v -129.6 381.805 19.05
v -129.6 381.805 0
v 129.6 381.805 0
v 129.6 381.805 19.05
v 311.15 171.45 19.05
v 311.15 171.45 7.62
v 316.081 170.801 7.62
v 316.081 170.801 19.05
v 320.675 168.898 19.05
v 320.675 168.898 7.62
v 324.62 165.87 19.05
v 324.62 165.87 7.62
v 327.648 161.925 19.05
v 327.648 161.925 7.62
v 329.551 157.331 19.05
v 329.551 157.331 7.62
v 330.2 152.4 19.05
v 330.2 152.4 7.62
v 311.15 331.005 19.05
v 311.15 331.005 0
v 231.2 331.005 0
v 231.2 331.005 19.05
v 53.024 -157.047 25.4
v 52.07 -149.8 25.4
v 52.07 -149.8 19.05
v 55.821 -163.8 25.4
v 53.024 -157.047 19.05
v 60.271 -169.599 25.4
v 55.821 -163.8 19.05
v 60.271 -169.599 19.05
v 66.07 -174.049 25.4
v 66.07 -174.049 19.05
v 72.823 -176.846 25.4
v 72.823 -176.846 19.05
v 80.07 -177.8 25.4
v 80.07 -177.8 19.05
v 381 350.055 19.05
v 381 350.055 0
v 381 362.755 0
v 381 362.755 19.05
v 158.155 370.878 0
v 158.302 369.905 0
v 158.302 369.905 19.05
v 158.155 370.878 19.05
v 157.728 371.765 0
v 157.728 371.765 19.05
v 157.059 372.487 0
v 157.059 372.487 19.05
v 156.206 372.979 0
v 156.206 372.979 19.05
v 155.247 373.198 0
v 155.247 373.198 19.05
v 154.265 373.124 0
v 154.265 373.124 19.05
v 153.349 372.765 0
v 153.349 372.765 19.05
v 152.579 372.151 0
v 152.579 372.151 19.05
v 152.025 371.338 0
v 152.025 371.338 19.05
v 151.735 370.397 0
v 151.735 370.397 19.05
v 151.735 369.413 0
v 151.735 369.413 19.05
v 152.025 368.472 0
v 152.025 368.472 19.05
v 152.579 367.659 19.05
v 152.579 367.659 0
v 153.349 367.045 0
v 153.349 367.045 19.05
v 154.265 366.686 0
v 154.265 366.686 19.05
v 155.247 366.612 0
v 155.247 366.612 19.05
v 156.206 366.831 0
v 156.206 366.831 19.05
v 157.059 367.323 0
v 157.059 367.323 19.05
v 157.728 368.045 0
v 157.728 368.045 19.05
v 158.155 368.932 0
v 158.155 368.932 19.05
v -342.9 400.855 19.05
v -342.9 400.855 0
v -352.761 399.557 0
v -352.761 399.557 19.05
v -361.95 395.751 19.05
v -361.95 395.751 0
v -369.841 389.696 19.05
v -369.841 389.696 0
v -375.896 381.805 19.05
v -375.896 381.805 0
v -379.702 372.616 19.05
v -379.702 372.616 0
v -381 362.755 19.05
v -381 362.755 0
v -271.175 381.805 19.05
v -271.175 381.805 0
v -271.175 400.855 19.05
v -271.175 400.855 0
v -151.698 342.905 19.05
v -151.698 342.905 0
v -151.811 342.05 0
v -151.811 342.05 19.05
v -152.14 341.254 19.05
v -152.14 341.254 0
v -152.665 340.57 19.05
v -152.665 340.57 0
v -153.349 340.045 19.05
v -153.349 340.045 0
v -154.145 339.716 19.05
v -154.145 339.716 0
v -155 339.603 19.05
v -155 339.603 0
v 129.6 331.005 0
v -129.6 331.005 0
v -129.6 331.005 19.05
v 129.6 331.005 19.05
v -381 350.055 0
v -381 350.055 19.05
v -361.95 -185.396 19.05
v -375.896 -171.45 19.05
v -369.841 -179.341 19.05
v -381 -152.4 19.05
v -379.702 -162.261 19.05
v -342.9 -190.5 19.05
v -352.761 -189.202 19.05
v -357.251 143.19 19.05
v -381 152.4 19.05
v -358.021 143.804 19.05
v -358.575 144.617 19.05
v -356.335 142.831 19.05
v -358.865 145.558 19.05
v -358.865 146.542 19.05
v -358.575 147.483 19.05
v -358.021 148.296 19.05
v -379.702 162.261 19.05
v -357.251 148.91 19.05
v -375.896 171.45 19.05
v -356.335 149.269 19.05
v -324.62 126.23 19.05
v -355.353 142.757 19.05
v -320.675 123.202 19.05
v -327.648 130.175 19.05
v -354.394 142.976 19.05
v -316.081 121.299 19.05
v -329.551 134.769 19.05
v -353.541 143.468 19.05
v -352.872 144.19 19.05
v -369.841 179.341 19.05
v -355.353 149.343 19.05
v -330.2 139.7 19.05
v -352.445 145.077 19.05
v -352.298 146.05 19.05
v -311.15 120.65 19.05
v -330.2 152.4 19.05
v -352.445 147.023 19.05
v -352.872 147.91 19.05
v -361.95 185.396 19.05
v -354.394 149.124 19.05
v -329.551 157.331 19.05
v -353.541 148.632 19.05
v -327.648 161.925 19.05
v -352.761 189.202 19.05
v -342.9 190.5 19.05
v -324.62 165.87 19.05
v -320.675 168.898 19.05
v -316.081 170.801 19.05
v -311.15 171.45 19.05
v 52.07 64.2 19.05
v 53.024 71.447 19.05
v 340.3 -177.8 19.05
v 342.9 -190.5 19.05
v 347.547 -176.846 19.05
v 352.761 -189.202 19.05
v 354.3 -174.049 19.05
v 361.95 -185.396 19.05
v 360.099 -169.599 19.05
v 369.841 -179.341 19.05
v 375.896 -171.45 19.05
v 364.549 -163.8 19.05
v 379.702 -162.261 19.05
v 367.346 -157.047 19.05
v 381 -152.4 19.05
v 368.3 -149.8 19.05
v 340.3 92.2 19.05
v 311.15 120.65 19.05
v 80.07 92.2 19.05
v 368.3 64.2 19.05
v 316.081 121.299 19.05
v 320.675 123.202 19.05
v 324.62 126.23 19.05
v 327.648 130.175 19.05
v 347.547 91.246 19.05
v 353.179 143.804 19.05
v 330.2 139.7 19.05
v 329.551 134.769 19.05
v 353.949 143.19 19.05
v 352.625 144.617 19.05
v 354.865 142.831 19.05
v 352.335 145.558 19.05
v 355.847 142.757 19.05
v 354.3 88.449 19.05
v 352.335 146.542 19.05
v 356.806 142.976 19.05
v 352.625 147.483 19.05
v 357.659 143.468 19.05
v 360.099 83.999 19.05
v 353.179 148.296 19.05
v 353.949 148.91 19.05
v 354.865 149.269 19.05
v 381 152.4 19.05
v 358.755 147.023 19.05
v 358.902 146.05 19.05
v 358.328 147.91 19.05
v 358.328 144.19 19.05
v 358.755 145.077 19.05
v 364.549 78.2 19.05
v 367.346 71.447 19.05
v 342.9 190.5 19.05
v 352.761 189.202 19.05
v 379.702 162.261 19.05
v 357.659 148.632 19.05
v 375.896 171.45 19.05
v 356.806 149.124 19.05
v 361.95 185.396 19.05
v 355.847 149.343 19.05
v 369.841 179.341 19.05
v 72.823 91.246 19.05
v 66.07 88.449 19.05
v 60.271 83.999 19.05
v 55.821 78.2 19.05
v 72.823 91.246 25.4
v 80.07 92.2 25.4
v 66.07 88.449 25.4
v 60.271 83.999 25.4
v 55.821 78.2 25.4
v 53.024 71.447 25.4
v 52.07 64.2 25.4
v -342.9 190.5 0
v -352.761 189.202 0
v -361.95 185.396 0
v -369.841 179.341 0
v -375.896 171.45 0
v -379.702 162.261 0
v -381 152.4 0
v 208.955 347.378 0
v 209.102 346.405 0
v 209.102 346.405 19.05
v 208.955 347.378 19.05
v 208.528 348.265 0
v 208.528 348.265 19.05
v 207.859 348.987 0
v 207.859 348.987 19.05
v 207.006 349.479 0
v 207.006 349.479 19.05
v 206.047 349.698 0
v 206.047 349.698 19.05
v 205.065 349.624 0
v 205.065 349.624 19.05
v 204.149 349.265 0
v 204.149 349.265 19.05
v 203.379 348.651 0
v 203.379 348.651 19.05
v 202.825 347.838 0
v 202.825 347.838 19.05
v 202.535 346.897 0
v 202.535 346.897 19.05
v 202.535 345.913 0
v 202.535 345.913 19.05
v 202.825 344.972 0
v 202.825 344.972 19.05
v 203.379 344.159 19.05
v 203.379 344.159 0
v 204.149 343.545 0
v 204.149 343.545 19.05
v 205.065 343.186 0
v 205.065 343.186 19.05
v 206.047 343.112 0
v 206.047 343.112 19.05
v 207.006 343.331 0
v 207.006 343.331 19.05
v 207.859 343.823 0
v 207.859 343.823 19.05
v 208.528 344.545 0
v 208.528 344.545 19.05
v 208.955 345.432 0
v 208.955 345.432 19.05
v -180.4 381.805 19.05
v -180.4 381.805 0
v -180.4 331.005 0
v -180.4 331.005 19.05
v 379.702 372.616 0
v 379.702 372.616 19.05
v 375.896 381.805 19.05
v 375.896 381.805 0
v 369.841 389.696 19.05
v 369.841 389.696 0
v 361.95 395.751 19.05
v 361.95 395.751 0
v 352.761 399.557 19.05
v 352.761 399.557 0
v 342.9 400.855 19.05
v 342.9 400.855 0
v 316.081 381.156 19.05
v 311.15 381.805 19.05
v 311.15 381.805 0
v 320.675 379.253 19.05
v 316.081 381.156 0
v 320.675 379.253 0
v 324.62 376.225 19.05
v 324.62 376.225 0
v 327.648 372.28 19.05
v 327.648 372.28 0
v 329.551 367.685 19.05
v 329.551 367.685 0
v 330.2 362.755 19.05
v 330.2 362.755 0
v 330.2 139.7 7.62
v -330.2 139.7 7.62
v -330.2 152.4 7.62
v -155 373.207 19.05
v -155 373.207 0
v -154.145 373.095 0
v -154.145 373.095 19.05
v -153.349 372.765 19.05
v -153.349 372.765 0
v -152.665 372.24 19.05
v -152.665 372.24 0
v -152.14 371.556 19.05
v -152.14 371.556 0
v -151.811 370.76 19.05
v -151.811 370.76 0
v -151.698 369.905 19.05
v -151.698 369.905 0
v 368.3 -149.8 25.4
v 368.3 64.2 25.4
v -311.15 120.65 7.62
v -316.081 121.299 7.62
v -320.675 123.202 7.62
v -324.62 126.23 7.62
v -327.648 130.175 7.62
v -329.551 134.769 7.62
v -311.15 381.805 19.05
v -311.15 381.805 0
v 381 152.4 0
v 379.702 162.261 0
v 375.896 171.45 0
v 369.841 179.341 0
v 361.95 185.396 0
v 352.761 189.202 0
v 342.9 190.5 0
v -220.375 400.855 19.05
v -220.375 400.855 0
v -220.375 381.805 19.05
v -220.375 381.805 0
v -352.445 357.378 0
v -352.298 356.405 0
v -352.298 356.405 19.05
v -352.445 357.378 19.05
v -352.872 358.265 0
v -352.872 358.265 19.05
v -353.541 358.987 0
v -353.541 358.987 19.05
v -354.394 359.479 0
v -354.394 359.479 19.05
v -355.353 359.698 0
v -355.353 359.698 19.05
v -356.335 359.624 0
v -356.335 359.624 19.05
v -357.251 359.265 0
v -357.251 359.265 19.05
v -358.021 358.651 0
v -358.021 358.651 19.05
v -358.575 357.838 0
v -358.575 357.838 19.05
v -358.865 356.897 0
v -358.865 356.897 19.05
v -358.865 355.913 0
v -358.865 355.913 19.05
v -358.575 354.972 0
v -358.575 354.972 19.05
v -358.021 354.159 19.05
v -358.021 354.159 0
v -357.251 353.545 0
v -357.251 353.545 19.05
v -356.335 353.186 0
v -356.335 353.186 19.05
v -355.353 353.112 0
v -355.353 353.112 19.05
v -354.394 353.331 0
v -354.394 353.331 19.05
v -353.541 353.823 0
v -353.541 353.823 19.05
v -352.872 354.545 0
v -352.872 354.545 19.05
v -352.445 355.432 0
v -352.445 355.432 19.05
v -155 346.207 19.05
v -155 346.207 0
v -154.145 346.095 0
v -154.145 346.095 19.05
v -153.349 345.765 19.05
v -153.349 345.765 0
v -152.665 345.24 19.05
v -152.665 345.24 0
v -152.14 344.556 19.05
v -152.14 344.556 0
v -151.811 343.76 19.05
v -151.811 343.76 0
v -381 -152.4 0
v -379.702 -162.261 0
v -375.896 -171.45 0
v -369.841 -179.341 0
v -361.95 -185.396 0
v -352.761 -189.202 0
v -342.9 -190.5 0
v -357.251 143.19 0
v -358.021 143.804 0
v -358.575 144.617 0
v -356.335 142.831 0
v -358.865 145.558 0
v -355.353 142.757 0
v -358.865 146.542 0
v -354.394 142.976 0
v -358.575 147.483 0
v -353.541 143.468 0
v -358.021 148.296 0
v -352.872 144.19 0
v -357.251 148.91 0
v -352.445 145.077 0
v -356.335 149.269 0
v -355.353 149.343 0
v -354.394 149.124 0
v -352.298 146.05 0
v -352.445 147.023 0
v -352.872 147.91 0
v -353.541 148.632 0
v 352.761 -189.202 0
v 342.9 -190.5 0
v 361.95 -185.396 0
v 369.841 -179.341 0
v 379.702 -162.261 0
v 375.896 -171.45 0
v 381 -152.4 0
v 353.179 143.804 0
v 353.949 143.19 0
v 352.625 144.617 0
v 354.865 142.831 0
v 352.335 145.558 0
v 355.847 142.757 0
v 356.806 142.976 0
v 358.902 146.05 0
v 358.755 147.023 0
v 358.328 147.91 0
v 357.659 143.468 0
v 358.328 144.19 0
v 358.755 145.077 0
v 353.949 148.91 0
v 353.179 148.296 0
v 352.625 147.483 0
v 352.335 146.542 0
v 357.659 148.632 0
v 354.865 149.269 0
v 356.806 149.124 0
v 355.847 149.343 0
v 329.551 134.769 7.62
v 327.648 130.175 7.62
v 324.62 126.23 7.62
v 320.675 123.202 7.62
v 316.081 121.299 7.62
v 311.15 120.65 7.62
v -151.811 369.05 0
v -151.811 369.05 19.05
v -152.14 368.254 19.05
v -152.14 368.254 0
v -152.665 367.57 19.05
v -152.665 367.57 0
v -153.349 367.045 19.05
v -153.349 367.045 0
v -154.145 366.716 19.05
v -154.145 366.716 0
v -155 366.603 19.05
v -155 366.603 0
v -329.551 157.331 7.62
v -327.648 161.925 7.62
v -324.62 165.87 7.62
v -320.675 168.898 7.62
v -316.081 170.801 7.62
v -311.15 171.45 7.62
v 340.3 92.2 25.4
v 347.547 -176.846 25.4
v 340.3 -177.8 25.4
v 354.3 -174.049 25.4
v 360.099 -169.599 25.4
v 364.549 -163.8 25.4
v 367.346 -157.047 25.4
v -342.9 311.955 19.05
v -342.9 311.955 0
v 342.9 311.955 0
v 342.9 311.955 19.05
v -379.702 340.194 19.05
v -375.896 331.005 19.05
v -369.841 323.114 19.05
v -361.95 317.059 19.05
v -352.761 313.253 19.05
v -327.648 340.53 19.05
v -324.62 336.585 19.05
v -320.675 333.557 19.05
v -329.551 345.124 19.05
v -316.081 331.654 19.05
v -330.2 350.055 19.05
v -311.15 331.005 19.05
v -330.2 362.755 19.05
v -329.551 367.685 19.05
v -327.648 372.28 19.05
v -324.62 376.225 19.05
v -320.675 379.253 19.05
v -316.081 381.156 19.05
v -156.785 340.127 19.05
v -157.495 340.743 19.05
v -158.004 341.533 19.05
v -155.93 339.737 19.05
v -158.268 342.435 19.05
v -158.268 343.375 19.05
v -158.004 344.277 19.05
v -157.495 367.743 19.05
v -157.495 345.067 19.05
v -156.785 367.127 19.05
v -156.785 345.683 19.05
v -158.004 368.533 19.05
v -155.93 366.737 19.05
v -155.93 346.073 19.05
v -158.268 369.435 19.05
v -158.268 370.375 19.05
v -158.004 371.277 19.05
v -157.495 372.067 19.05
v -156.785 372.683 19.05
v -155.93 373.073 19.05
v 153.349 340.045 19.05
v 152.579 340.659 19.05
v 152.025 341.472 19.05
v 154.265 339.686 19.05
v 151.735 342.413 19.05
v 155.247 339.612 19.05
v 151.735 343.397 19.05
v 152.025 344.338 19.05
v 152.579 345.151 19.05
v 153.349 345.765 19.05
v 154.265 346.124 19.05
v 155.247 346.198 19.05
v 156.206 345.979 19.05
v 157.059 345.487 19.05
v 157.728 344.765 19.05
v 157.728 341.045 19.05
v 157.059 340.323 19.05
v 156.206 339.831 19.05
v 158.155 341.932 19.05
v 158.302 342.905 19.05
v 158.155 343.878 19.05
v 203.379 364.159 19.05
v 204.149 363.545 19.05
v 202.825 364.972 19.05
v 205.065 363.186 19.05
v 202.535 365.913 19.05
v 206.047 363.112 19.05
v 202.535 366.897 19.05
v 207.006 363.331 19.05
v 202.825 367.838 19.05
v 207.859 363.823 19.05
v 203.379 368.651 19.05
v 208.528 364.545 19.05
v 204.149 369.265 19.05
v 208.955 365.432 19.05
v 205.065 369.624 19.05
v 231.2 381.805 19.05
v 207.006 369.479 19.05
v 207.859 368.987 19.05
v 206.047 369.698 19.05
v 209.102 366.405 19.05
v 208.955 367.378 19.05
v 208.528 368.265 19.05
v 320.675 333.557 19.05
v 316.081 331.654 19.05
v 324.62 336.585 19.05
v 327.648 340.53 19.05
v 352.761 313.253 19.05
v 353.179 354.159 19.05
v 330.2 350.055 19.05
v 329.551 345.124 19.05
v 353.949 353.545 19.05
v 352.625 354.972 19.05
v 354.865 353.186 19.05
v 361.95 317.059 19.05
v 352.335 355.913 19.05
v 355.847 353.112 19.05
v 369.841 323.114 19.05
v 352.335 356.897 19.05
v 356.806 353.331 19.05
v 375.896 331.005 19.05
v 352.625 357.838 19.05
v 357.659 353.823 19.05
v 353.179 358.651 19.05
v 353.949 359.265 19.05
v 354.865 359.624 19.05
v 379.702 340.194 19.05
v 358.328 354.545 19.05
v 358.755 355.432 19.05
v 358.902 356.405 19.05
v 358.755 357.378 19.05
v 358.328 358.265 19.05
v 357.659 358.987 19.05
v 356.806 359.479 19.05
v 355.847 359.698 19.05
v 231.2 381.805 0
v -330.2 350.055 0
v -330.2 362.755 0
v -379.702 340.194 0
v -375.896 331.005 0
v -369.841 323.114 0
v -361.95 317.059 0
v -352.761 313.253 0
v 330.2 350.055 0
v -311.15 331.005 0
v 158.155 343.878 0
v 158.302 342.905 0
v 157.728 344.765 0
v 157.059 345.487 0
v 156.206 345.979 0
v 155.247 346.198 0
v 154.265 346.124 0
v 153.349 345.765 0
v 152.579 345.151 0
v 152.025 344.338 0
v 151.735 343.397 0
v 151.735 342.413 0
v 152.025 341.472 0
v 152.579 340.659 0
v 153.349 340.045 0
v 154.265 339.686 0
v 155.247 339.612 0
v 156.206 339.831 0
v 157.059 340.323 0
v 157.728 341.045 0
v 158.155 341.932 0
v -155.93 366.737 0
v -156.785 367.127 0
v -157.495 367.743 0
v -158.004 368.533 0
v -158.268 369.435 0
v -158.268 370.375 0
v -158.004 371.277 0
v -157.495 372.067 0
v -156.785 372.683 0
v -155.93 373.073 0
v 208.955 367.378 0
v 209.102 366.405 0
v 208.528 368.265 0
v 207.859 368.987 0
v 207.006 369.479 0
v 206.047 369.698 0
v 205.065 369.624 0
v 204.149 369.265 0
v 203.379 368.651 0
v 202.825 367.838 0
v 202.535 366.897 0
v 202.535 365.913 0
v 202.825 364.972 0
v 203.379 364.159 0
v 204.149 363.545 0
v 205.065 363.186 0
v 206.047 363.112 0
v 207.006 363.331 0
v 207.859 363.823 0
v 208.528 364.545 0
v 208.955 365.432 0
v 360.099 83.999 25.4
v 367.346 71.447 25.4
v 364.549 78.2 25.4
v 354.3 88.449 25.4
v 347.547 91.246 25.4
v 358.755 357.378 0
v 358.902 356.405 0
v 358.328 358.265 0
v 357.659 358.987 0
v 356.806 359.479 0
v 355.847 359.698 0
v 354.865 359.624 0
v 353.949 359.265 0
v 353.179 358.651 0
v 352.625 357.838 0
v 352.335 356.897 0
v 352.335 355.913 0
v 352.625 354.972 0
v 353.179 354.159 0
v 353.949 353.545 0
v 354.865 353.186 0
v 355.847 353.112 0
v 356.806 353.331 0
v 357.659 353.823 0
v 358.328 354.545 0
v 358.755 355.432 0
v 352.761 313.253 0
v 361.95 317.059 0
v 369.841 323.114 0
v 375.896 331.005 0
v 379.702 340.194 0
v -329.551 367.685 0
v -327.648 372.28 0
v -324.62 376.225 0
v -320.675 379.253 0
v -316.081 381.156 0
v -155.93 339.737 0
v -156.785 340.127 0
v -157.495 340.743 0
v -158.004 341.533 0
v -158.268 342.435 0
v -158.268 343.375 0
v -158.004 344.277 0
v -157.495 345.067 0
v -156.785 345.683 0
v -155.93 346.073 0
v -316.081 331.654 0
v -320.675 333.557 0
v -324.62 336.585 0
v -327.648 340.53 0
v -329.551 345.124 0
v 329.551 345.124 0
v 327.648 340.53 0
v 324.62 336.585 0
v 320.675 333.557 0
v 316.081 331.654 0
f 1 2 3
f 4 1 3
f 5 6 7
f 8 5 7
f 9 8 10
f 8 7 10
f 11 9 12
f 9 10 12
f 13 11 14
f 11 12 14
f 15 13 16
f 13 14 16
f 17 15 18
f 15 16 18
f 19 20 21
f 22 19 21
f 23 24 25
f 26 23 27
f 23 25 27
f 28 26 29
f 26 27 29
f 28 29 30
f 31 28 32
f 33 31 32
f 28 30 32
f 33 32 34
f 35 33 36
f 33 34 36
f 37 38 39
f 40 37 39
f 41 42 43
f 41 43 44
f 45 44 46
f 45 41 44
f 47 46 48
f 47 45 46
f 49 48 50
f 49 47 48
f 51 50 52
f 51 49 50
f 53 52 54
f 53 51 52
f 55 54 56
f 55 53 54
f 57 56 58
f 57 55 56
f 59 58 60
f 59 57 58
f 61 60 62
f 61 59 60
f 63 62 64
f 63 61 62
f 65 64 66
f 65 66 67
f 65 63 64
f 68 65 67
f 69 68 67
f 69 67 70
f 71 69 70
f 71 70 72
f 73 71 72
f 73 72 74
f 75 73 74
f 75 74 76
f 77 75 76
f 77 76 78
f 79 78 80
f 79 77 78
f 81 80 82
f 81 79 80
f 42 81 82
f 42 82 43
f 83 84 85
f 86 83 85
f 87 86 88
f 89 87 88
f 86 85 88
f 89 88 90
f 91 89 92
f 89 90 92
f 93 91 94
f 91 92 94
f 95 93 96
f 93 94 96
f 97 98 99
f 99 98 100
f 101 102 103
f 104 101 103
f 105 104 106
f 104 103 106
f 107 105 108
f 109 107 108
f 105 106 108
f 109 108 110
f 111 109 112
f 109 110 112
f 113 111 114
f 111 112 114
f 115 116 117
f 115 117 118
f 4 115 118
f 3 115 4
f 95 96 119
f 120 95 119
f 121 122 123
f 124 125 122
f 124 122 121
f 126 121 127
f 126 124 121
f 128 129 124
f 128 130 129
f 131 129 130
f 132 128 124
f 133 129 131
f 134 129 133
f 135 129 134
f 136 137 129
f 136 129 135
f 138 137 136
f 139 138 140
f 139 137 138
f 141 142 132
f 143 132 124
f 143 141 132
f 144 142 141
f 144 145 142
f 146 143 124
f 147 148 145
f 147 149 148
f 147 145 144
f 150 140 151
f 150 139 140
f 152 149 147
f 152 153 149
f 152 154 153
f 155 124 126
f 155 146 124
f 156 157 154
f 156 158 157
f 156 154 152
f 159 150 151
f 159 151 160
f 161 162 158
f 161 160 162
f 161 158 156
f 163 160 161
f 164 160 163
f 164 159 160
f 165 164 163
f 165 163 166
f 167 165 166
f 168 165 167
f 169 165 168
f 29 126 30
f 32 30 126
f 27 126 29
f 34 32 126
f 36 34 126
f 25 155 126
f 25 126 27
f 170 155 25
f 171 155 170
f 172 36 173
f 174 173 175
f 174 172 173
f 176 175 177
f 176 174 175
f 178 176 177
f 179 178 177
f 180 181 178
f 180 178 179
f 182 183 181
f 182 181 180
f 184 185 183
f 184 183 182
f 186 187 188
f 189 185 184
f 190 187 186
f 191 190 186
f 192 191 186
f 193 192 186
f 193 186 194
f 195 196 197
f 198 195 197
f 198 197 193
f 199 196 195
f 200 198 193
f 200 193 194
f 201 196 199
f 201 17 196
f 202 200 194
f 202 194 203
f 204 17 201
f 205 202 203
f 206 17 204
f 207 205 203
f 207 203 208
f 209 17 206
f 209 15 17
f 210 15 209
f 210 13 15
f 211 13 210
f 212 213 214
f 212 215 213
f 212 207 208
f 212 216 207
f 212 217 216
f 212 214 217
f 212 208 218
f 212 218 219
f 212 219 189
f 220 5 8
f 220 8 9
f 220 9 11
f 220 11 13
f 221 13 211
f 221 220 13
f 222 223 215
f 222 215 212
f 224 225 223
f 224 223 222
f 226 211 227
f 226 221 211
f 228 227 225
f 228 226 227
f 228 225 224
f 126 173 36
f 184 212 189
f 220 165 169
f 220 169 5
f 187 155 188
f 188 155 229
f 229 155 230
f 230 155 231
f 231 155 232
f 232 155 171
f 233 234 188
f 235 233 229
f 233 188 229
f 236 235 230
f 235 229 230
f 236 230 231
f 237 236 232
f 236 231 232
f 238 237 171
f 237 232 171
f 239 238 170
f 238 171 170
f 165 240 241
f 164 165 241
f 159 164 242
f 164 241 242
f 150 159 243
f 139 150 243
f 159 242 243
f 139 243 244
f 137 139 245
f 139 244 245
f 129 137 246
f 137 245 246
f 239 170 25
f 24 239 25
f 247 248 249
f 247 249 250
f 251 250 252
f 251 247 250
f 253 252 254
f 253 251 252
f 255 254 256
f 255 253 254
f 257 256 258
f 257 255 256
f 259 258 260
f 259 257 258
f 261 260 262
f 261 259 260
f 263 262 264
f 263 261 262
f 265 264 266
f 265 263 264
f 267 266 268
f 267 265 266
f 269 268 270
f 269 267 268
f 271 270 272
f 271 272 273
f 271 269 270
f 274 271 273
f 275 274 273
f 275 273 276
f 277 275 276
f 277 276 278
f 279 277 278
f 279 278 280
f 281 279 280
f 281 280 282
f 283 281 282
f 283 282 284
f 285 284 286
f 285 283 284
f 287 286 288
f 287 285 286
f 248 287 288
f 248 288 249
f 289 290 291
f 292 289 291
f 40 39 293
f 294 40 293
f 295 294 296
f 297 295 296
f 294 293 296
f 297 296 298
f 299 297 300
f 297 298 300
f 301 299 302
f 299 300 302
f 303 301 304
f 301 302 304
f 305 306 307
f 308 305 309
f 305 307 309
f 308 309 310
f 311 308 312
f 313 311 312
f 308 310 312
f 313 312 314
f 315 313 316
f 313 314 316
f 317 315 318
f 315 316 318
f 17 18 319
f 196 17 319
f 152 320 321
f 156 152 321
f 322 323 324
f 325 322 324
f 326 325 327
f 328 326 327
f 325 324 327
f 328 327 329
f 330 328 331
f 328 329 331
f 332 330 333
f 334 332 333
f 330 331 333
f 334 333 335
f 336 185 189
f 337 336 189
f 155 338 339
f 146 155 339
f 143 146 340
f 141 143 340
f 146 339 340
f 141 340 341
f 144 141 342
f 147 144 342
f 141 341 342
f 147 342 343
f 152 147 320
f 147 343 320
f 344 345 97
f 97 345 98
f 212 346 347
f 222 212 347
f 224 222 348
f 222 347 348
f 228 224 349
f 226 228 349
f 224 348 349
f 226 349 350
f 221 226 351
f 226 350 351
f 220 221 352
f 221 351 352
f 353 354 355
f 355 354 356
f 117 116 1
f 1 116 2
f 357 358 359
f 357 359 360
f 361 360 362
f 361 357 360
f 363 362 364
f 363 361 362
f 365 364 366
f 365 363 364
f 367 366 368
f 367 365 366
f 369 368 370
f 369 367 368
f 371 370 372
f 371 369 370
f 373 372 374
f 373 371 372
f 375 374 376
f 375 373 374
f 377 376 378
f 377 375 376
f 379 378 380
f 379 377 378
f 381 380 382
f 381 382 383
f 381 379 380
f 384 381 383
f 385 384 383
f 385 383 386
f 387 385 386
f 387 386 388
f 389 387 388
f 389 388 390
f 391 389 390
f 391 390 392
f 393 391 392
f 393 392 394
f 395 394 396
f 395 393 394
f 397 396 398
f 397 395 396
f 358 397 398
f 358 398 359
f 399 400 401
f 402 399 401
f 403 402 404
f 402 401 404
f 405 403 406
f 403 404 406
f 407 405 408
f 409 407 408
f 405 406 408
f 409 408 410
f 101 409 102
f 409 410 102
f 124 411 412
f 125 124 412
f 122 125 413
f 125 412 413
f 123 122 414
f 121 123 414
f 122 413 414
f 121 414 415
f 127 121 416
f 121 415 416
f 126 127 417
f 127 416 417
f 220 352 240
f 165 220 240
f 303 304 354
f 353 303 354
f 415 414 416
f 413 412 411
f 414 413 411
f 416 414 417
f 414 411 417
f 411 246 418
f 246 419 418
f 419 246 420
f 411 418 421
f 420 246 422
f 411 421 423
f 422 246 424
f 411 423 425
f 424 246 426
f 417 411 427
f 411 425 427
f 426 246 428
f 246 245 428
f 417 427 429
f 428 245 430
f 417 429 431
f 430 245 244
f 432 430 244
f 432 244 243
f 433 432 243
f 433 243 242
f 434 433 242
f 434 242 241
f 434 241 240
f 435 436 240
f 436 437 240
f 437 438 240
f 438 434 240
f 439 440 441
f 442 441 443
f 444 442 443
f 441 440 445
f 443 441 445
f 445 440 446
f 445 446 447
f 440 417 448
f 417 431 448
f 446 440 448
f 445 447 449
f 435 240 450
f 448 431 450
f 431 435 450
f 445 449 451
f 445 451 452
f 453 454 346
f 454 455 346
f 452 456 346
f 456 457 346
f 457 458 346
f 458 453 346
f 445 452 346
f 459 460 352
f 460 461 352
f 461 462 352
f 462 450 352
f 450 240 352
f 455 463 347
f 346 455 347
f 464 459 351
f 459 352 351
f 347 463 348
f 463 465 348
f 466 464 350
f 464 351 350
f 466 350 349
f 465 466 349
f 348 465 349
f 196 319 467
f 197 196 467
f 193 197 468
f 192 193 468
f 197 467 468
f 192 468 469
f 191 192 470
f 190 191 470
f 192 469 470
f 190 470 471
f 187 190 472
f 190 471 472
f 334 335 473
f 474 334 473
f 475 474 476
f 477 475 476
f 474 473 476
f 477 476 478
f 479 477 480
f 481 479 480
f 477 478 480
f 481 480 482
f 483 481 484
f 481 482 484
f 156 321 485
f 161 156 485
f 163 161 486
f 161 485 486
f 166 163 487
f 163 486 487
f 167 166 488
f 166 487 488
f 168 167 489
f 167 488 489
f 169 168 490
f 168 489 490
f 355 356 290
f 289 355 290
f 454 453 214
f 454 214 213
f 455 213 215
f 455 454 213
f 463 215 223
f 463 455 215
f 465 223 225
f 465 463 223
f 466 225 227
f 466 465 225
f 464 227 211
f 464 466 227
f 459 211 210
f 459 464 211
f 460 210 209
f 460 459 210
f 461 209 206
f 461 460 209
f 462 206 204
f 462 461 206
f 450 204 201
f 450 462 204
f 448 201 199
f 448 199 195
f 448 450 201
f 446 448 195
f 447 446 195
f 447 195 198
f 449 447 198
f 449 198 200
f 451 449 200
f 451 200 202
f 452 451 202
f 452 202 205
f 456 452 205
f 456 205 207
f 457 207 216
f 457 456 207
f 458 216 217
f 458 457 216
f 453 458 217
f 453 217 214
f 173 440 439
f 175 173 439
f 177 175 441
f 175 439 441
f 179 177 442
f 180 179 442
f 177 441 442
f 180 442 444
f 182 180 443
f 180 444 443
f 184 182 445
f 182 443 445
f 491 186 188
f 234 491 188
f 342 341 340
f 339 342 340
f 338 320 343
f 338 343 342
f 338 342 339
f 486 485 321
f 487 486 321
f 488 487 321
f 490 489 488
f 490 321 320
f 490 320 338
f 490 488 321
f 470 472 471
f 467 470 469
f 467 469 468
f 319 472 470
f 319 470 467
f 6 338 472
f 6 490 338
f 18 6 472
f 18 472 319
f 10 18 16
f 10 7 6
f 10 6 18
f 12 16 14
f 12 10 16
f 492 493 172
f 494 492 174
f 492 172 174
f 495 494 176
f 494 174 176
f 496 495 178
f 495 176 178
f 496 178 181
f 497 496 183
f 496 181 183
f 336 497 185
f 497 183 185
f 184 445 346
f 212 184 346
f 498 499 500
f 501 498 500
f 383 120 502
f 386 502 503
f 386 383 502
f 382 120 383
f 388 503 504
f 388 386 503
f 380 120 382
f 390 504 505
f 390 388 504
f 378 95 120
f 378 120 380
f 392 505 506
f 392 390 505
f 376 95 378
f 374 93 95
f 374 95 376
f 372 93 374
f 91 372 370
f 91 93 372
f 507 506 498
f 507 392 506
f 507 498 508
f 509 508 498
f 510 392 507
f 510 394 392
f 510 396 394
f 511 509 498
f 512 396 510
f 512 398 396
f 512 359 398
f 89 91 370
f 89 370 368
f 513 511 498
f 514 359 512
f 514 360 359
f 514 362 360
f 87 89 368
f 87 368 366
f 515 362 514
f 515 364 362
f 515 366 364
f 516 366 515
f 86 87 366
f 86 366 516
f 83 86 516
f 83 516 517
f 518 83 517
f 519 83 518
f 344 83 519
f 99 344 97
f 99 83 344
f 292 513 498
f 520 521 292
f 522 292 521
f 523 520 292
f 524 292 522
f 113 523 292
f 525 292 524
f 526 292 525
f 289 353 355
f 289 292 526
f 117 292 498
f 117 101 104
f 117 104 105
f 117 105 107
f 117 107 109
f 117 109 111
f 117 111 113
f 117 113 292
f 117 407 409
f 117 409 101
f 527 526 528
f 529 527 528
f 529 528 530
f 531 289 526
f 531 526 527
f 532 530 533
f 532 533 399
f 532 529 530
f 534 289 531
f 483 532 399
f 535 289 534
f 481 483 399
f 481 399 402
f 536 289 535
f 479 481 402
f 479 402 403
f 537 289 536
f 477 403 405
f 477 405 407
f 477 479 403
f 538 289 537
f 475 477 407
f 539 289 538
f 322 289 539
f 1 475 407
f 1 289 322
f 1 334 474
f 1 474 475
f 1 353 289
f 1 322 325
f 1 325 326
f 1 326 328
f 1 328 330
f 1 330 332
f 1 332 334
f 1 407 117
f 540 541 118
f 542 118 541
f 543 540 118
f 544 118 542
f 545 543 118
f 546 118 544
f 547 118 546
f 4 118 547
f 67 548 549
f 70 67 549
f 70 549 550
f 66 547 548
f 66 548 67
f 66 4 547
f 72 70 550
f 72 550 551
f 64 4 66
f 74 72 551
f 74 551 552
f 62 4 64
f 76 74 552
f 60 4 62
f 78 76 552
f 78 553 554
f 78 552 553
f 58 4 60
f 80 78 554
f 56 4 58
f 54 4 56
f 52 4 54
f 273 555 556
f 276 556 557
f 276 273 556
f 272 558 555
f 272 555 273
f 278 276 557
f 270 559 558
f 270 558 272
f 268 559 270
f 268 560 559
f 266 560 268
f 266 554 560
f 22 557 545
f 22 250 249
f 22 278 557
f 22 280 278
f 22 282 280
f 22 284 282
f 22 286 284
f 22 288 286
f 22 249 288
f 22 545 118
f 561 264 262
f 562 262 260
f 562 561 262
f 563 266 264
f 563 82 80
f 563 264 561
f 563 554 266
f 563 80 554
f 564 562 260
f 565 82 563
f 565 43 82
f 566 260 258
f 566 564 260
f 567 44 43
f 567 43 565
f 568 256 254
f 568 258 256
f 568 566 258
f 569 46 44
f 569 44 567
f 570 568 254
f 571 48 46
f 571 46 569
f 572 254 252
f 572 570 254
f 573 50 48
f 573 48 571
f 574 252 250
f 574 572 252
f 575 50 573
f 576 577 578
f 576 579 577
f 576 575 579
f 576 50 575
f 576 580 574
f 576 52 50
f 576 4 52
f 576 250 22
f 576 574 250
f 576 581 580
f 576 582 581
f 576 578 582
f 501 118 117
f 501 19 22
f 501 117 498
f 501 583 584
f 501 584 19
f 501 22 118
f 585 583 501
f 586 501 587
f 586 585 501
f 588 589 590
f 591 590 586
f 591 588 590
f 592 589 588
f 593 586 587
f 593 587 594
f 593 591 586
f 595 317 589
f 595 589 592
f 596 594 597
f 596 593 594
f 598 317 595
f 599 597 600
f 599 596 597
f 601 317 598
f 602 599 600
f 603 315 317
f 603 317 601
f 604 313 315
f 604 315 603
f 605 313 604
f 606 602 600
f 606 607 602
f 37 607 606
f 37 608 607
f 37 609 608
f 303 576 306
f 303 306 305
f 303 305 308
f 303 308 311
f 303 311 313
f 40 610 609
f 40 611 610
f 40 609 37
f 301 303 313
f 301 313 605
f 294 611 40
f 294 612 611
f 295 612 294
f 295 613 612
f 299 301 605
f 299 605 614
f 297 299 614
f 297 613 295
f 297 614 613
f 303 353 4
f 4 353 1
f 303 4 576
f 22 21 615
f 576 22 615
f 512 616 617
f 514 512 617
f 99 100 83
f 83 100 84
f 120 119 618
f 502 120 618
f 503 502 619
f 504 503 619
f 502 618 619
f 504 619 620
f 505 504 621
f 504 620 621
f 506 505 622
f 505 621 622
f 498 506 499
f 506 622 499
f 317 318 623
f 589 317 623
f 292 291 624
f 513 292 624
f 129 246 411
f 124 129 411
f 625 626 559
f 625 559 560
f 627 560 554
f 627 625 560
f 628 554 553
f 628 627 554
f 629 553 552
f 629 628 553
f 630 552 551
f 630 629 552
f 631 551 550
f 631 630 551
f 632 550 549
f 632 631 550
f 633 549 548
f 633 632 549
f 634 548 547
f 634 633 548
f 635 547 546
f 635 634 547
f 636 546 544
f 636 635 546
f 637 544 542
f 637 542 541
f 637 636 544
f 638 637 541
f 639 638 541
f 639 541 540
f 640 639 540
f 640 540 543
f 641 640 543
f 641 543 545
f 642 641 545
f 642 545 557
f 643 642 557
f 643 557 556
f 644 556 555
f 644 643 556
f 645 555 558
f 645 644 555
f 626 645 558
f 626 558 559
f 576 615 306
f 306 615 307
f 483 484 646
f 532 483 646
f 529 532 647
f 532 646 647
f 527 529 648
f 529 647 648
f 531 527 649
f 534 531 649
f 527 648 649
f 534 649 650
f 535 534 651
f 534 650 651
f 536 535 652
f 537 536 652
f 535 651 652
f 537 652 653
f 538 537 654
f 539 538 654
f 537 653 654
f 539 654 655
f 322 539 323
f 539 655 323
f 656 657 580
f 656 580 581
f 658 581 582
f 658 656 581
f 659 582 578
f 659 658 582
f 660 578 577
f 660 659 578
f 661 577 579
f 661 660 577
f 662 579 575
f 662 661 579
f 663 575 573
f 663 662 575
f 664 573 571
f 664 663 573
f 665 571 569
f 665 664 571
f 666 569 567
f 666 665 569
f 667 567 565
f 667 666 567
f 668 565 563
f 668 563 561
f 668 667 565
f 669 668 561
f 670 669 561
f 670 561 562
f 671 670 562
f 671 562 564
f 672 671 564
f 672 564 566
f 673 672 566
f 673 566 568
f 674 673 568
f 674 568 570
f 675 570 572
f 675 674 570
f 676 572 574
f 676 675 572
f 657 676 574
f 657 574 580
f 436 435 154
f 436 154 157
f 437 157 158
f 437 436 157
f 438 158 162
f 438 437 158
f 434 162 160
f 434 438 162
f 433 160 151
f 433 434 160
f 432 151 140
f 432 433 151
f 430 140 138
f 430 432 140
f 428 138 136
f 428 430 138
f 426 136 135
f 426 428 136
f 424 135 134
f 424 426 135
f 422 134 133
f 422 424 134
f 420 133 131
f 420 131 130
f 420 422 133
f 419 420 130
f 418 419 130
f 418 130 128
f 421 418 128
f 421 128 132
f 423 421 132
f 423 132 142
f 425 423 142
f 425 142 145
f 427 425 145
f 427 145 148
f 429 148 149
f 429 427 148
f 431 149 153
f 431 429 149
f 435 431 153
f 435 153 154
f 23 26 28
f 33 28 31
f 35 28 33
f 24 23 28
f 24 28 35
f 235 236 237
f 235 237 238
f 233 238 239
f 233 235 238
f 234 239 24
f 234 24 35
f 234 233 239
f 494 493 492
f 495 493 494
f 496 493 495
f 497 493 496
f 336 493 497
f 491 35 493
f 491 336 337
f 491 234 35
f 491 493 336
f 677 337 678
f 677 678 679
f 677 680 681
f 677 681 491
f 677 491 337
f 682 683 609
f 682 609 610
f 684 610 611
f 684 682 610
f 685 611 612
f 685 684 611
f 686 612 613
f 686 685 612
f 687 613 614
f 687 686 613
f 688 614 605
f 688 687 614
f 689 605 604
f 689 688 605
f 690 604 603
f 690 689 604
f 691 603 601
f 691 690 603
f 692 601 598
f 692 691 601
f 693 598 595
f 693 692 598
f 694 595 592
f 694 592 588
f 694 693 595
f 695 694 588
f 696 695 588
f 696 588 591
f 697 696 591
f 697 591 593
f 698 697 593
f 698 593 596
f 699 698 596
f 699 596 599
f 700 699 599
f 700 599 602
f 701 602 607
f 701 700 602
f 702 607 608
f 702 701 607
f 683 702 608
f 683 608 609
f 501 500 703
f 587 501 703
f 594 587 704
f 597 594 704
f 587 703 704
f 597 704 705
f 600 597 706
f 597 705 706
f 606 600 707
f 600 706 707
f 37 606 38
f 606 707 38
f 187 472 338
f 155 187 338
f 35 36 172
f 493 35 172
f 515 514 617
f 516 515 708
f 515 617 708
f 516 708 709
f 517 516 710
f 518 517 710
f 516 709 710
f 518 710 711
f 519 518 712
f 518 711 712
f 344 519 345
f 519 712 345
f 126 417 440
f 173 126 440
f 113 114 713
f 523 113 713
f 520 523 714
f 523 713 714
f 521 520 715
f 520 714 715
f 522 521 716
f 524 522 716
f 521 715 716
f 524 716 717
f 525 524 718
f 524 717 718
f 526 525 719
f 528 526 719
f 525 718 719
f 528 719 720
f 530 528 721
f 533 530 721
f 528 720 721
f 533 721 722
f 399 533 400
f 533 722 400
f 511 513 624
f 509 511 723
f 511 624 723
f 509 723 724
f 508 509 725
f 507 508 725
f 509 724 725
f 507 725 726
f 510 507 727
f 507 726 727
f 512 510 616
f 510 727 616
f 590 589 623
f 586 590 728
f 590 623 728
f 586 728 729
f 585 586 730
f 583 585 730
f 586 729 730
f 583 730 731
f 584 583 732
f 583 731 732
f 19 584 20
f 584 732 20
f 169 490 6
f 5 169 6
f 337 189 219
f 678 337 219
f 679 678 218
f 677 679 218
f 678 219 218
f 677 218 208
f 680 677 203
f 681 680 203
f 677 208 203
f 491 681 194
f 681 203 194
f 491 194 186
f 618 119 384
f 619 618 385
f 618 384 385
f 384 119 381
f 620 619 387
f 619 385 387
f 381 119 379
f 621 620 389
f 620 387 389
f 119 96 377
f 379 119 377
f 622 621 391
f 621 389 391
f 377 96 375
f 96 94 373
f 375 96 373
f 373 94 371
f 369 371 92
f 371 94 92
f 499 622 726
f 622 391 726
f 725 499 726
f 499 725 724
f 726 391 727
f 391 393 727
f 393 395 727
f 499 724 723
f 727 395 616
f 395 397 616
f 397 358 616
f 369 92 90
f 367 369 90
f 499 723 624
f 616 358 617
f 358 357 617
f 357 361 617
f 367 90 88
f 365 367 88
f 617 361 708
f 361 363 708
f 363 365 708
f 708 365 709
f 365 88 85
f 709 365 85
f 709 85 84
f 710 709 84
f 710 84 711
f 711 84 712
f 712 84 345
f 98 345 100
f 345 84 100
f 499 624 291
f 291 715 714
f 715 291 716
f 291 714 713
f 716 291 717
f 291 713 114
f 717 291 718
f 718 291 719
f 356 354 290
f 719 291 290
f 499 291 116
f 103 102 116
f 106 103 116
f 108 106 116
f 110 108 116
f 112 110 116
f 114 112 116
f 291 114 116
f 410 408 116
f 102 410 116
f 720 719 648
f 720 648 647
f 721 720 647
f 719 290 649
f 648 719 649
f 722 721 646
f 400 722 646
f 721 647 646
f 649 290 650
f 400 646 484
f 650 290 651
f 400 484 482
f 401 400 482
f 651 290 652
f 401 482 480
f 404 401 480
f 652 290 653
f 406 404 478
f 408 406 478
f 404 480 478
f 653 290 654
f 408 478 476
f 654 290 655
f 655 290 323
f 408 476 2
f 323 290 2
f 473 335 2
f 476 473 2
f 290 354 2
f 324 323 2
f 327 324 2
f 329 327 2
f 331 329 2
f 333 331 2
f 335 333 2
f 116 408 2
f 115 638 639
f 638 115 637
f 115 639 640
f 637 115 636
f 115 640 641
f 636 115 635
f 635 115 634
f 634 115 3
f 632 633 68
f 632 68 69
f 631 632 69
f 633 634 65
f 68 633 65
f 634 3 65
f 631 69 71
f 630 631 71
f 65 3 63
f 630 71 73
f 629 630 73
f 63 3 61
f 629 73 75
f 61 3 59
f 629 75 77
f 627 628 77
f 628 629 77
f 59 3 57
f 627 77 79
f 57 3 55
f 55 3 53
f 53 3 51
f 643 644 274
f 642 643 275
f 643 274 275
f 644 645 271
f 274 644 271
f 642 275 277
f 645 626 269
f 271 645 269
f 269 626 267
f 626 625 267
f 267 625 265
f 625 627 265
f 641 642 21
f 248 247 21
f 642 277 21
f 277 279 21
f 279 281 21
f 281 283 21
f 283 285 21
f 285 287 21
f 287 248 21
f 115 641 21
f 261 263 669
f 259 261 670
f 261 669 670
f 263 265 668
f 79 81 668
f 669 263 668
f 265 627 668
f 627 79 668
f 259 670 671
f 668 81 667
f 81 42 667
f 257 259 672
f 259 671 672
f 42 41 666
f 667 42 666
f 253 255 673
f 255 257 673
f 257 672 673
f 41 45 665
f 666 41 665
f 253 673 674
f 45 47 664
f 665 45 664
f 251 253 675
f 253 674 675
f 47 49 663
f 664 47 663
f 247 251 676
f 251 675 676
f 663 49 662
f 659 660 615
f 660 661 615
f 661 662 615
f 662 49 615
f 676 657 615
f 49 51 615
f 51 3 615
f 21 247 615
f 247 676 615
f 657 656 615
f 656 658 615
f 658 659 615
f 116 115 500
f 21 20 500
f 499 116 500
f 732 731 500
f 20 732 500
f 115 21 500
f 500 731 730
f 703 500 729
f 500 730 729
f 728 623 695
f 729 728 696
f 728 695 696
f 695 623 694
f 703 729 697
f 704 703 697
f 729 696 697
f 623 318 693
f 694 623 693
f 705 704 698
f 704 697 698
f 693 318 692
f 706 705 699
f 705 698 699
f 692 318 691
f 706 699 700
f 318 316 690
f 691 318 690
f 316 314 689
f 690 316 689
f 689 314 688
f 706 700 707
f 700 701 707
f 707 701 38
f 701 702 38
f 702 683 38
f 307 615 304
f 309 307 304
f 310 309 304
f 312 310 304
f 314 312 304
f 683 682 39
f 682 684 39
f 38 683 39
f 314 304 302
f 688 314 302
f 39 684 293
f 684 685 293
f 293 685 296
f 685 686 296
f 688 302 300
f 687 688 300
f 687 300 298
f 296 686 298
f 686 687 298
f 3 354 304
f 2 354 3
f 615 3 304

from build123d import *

# Parameters (mm, degrees)
F0_R     = 3.302
F0_W     = 259.2
F0_H     = 50.8
F1_DEPTH = 19.05
F2_DEPTH = 19.05
F3_DEPTH = 7.62
F4_DEPTH = 25.4


# Not quite as in the source:
# - a feature names something its author has since deleted; it is built from what else it names


with BuildPart() as f1:
    # F0 (on Top) → F1 (new body)
    with BuildSketch(Plane.XY):
        with BuildLine():
            ThreePointArc((-381, 350.0549432278), (-369.8407683632, 323.1141748646), (-342.9, 311.9549432278))
            Line((-342.9, 311.9549432278), (342.9, 311.9549432278))
            ThreePointArc((342.9, 311.9549432278), (369.8407683632, 323.1141748646), (381, 350.0549432278))
            Line((381, 350.0549432278), (381, 362.7549432278))
            ThreePointArc((381, 362.7549432278), (369.8407683632, 389.695711591), (342.9, 400.8549432278))
            Line((342.9, 400.8549432278), (-220.375, 400.8549432278))
            Line((-220.375, 400.8549432278), (-220.375, 381.8049432278))
            Line((-220.375, 381.8049432278), (-180.4, 381.8049432278))
            Line((-180.4, 381.8049432278), (-180.4, 331.0049432278))
            Line((-180.4, 331.0049432278), (-311.15, 331.0049432278))
            ThreePointArc((-311.15, 331.0049432278), (-324.6203841816, 336.5845590462), (-330.2, 350.0549432278))
            Line((-330.2, 350.0549432278), (-330.2, 362.7549432278))
            ThreePointArc((-330.2, 362.7549432278), (-324.6203841816, 376.2253274094), (-311.15, 381.8049432278))
            Line((-311.15, 381.8049432278), (-271.175, 381.8049432278))
            Line((-271.175, 381.8049432278), (-271.175, 400.8549432278))
            Line((-271.175, 400.8549432278), (-342.9, 400.8549432278))
            ThreePointArc((-342.9, 400.8549432278), (-369.8407683632, 389.695711591), (-381, 362.7549432278))
            Line((-381, 362.7549432278), (-381, 350.0549432278))
        make_face()
        with Locations((-355.6, 356.4049432278)):
            Circle(F0_R, mode=Mode.SUBTRACT)
        with BuildLine():
            ThreePointArc((-155, 339.6030464278), (-158.302, 342.9050464278), (-155, 346.2070464278))
            ThreePointArc((-155, 346.2070464278), (-152.6651334085, 345.2399130192), (-151.698, 342.9050464278))
            ThreePointArc((-151.698, 342.9050464278), (-152.6651334085, 340.5701798363), (-155, 339.6030464278))
        make_face(mode=Mode.SUBTRACT)
        with BuildLine():
            ThreePointArc((-155, 366.6030432278), (-158.302, 369.9050432278), (-155, 373.2070432278))
            ThreePointArc((-155, 373.2070432278), (-152.6651334085, 372.2399098192), (-151.698, 369.9050432278))
            ThreePointArc((-151.698, 369.9050432278), (-152.6651334085, 367.5701766363), (-155, 366.6030432278))
        make_face(mode=Mode.SUBTRACT)
        with Locations((0, 356.4049432278)):
            Rectangle(F0_W, F0_H, mode=Mode.SUBTRACT)
        with Locations((155, 342.9050464278)):
            Circle(F0_R, mode=Mode.SUBTRACT)
        with Locations((155, 369.9050432278)):
            Circle(F0_R, mode=Mode.SUBTRACT)
        with Locations((205.8, 346.4049378278)):
            Circle(F0_R, mode=Mode.SUBTRACT)
        with Locations((205.8, 366.4049486278)):
            Circle(F0_R, mode=Mode.SUBTRACT)
        with BuildLine():
            Line((231.2, 331.0049432278), (231.2, 381.8049432278))
            Line((231.2, 381.8049432278), (311.15, 381.8049432278))
            ThreePointArc((311.15, 381.8049432278), (324.6203841816, 376.2253274094), (330.2, 362.7549432278))
            Line((330.2, 362.7549432278), (330.2, 350.0549432278))
            ThreePointArc((330.2, 350.0549432278), (324.6203841816, 336.5845590462), (311.15, 331.0049432278))
            Line((311.15, 331.0049432278), (231.2, 331.0049432278))
        make_face(mode=Mode.SUBTRACT)
        with Locations((355.6, 356.4049432278)):
            Circle(F0_R, mode=Mode.SUBTRACT)
    extrude(amount=F1_DEPTH)


with BuildPart() as f2:
    # F0 (on Top) → F2 (new body)
    with BuildSketch(Plane.XY):
        with BuildLine():
            Line((-342.9, -190.5), (342.9, -190.5))
            ThreePointArc((342.9, -190.5), (369.8407683632, -179.3407683632), (381, -152.4))
            Line((381, -152.4), (381, 152.4))
            ThreePointArc((381, 152.4), (369.8407683632, 179.3407683632), (342.9, 190.5))
            Line((342.9, 190.5), (-342.9, 190.5))
            ThreePointArc((-342.9, 190.5), (-369.8407683632, 179.3407683632), (-381, 152.4))
            Line((-381, 152.4), (-381, -152.4))
            ThreePointArc((-381, -152.4), (-369.8407683632, -179.3407683632), (-342.9, -190.5))
        make_face()
        with BuildLine():
            ThreePointArc((368.3, -149.8), (360.0989898732, -169.5989898732), (340.3, -177.8))
            Line((340.3, -177.8), (80.07, -177.8))
            ThreePointArc((80.07, -177.8), (60.2710101268, -169.5989898732), (52.07, -149.8))
            Line((52.07, -149.8), (52.07, 64.2))
            ThreePointArc((52.07, 64.2), (60.2710101268, 83.9989898732), (80.07, 92.2))
            Line((80.07, 92.2), (340.3, 92.2))
            ThreePointArc((340.3, 92.2), (360.0989898732, 83.9989898732), (368.3, 64.2))
            Line((368.3, 64.2), (368.3, -149.8))
        make_face(mode=Mode.SUBTRACT)
        with Locations((-355.6, 146.05)):
            Circle(F0_R, mode=Mode.SUBTRACT)
        with BuildLine():
            ThreePointArc((-330.2, 152.4), (-324.6203841816, 165.8703841816), (-311.15, 171.45))
            Line((-311.15, 171.45), (311.15, 171.45))
            ThreePointArc((311.15, 171.45), (324.6203841816, 165.8703841816), (330.2, 152.4))
            Line((330.2, 152.4), (330.2, 139.7))
            ThreePointArc((330.2, 139.7), (324.6203841816, 126.2296158184), (311.15, 120.65))
            Line((311.15, 120.65), (-311.15, 120.65))
            ThreePointArc((-311.15, 120.65), (-324.6203841816, 126.2296158184), (-330.2, 139.7))
            Line((-330.2, 139.7), (-330.2, 152.4))
        make_face(mode=Mode.SUBTRACT)
        with Locations((355.6, 146.05)):
            Circle(F0_R, mode=Mode.SUBTRACT)
        with BuildLine():
            Line((80.07, -177.8), (340.3, -177.8))
            ThreePointArc((340.3, -177.8), (360.0989898732, -169.5989898732), (368.3, -149.8))
            Line((368.3, -149.8), (368.3, 64.2))
            ThreePointArc((368.3, 64.2), (360.0989898732, 83.9989898732), (340.3, 92.2))
            Line((340.3, 92.2), (80.07, 92.2))
            ThreePointArc((80.07, 92.2), (60.2710101268, 83.9989898732), (52.07, 64.2))
            Line((52.07, 64.2), (52.07, -149.8))
            ThreePointArc((52.07, -149.8), (60.2710101268, -169.5989898732), (80.07, -177.8))
        make_face()
    extrude(amount=F2_DEPTH)

    # F0 (on Top) → F3 (join)
    with BuildSketch(Plane.XY):
        with BuildLine():
            Line((311.15, 171.45), (-311.15, 171.45))
            ThreePointArc((-311.15, 171.45), (-324.6203841816, 165.8703841816), (-330.2, 152.4))
            Line((-330.2, 152.4), (-330.2, 139.7))
            ThreePointArc((-330.2, 139.7), (-324.6203841816, 126.2296158184), (-311.15, 120.65))
            Line((-311.15, 120.65), (311.15, 120.65))
            ThreePointArc((311.15, 120.65), (324.6203841816, 126.2296158184), (330.2, 139.7))
            Line((330.2, 139.7), (330.2, 152.4))
            ThreePointArc((330.2, 152.4), (324.6203841816, 165.8703841816), (311.15, 171.45))
        make_face()
    extrude(amount=F3_DEPTH)

    # F0 (on Top) → F4 (join)
    with BuildSketch(Plane.XY):
        with BuildLine():
            Line((80.07, -177.8), (340.3, -177.8))
            ThreePointArc((340.3, -177.8), (360.0989898732, -169.5989898732), (368.3, -149.8))
            Line((368.3, -149.8), (368.3, 64.2))
            ThreePointArc((368.3, 64.2), (360.0989898732, 83.9989898732), (340.3, 92.2))
            Line((340.3, 92.2), (80.07, 92.2))
            ThreePointArc((80.07, 92.2), (60.2710101268, 83.9989898732), (52.07, 64.2))
            Line((52.07, 64.2), (52.07, -149.8))
            ThreePointArc((52.07, -149.8), (60.2710101268, -169.5989898732), (80.07, -177.8))
        make_face()
    extrude(amount=F4_DEPTH)


solid = Compound([f1.part, f2.part])
